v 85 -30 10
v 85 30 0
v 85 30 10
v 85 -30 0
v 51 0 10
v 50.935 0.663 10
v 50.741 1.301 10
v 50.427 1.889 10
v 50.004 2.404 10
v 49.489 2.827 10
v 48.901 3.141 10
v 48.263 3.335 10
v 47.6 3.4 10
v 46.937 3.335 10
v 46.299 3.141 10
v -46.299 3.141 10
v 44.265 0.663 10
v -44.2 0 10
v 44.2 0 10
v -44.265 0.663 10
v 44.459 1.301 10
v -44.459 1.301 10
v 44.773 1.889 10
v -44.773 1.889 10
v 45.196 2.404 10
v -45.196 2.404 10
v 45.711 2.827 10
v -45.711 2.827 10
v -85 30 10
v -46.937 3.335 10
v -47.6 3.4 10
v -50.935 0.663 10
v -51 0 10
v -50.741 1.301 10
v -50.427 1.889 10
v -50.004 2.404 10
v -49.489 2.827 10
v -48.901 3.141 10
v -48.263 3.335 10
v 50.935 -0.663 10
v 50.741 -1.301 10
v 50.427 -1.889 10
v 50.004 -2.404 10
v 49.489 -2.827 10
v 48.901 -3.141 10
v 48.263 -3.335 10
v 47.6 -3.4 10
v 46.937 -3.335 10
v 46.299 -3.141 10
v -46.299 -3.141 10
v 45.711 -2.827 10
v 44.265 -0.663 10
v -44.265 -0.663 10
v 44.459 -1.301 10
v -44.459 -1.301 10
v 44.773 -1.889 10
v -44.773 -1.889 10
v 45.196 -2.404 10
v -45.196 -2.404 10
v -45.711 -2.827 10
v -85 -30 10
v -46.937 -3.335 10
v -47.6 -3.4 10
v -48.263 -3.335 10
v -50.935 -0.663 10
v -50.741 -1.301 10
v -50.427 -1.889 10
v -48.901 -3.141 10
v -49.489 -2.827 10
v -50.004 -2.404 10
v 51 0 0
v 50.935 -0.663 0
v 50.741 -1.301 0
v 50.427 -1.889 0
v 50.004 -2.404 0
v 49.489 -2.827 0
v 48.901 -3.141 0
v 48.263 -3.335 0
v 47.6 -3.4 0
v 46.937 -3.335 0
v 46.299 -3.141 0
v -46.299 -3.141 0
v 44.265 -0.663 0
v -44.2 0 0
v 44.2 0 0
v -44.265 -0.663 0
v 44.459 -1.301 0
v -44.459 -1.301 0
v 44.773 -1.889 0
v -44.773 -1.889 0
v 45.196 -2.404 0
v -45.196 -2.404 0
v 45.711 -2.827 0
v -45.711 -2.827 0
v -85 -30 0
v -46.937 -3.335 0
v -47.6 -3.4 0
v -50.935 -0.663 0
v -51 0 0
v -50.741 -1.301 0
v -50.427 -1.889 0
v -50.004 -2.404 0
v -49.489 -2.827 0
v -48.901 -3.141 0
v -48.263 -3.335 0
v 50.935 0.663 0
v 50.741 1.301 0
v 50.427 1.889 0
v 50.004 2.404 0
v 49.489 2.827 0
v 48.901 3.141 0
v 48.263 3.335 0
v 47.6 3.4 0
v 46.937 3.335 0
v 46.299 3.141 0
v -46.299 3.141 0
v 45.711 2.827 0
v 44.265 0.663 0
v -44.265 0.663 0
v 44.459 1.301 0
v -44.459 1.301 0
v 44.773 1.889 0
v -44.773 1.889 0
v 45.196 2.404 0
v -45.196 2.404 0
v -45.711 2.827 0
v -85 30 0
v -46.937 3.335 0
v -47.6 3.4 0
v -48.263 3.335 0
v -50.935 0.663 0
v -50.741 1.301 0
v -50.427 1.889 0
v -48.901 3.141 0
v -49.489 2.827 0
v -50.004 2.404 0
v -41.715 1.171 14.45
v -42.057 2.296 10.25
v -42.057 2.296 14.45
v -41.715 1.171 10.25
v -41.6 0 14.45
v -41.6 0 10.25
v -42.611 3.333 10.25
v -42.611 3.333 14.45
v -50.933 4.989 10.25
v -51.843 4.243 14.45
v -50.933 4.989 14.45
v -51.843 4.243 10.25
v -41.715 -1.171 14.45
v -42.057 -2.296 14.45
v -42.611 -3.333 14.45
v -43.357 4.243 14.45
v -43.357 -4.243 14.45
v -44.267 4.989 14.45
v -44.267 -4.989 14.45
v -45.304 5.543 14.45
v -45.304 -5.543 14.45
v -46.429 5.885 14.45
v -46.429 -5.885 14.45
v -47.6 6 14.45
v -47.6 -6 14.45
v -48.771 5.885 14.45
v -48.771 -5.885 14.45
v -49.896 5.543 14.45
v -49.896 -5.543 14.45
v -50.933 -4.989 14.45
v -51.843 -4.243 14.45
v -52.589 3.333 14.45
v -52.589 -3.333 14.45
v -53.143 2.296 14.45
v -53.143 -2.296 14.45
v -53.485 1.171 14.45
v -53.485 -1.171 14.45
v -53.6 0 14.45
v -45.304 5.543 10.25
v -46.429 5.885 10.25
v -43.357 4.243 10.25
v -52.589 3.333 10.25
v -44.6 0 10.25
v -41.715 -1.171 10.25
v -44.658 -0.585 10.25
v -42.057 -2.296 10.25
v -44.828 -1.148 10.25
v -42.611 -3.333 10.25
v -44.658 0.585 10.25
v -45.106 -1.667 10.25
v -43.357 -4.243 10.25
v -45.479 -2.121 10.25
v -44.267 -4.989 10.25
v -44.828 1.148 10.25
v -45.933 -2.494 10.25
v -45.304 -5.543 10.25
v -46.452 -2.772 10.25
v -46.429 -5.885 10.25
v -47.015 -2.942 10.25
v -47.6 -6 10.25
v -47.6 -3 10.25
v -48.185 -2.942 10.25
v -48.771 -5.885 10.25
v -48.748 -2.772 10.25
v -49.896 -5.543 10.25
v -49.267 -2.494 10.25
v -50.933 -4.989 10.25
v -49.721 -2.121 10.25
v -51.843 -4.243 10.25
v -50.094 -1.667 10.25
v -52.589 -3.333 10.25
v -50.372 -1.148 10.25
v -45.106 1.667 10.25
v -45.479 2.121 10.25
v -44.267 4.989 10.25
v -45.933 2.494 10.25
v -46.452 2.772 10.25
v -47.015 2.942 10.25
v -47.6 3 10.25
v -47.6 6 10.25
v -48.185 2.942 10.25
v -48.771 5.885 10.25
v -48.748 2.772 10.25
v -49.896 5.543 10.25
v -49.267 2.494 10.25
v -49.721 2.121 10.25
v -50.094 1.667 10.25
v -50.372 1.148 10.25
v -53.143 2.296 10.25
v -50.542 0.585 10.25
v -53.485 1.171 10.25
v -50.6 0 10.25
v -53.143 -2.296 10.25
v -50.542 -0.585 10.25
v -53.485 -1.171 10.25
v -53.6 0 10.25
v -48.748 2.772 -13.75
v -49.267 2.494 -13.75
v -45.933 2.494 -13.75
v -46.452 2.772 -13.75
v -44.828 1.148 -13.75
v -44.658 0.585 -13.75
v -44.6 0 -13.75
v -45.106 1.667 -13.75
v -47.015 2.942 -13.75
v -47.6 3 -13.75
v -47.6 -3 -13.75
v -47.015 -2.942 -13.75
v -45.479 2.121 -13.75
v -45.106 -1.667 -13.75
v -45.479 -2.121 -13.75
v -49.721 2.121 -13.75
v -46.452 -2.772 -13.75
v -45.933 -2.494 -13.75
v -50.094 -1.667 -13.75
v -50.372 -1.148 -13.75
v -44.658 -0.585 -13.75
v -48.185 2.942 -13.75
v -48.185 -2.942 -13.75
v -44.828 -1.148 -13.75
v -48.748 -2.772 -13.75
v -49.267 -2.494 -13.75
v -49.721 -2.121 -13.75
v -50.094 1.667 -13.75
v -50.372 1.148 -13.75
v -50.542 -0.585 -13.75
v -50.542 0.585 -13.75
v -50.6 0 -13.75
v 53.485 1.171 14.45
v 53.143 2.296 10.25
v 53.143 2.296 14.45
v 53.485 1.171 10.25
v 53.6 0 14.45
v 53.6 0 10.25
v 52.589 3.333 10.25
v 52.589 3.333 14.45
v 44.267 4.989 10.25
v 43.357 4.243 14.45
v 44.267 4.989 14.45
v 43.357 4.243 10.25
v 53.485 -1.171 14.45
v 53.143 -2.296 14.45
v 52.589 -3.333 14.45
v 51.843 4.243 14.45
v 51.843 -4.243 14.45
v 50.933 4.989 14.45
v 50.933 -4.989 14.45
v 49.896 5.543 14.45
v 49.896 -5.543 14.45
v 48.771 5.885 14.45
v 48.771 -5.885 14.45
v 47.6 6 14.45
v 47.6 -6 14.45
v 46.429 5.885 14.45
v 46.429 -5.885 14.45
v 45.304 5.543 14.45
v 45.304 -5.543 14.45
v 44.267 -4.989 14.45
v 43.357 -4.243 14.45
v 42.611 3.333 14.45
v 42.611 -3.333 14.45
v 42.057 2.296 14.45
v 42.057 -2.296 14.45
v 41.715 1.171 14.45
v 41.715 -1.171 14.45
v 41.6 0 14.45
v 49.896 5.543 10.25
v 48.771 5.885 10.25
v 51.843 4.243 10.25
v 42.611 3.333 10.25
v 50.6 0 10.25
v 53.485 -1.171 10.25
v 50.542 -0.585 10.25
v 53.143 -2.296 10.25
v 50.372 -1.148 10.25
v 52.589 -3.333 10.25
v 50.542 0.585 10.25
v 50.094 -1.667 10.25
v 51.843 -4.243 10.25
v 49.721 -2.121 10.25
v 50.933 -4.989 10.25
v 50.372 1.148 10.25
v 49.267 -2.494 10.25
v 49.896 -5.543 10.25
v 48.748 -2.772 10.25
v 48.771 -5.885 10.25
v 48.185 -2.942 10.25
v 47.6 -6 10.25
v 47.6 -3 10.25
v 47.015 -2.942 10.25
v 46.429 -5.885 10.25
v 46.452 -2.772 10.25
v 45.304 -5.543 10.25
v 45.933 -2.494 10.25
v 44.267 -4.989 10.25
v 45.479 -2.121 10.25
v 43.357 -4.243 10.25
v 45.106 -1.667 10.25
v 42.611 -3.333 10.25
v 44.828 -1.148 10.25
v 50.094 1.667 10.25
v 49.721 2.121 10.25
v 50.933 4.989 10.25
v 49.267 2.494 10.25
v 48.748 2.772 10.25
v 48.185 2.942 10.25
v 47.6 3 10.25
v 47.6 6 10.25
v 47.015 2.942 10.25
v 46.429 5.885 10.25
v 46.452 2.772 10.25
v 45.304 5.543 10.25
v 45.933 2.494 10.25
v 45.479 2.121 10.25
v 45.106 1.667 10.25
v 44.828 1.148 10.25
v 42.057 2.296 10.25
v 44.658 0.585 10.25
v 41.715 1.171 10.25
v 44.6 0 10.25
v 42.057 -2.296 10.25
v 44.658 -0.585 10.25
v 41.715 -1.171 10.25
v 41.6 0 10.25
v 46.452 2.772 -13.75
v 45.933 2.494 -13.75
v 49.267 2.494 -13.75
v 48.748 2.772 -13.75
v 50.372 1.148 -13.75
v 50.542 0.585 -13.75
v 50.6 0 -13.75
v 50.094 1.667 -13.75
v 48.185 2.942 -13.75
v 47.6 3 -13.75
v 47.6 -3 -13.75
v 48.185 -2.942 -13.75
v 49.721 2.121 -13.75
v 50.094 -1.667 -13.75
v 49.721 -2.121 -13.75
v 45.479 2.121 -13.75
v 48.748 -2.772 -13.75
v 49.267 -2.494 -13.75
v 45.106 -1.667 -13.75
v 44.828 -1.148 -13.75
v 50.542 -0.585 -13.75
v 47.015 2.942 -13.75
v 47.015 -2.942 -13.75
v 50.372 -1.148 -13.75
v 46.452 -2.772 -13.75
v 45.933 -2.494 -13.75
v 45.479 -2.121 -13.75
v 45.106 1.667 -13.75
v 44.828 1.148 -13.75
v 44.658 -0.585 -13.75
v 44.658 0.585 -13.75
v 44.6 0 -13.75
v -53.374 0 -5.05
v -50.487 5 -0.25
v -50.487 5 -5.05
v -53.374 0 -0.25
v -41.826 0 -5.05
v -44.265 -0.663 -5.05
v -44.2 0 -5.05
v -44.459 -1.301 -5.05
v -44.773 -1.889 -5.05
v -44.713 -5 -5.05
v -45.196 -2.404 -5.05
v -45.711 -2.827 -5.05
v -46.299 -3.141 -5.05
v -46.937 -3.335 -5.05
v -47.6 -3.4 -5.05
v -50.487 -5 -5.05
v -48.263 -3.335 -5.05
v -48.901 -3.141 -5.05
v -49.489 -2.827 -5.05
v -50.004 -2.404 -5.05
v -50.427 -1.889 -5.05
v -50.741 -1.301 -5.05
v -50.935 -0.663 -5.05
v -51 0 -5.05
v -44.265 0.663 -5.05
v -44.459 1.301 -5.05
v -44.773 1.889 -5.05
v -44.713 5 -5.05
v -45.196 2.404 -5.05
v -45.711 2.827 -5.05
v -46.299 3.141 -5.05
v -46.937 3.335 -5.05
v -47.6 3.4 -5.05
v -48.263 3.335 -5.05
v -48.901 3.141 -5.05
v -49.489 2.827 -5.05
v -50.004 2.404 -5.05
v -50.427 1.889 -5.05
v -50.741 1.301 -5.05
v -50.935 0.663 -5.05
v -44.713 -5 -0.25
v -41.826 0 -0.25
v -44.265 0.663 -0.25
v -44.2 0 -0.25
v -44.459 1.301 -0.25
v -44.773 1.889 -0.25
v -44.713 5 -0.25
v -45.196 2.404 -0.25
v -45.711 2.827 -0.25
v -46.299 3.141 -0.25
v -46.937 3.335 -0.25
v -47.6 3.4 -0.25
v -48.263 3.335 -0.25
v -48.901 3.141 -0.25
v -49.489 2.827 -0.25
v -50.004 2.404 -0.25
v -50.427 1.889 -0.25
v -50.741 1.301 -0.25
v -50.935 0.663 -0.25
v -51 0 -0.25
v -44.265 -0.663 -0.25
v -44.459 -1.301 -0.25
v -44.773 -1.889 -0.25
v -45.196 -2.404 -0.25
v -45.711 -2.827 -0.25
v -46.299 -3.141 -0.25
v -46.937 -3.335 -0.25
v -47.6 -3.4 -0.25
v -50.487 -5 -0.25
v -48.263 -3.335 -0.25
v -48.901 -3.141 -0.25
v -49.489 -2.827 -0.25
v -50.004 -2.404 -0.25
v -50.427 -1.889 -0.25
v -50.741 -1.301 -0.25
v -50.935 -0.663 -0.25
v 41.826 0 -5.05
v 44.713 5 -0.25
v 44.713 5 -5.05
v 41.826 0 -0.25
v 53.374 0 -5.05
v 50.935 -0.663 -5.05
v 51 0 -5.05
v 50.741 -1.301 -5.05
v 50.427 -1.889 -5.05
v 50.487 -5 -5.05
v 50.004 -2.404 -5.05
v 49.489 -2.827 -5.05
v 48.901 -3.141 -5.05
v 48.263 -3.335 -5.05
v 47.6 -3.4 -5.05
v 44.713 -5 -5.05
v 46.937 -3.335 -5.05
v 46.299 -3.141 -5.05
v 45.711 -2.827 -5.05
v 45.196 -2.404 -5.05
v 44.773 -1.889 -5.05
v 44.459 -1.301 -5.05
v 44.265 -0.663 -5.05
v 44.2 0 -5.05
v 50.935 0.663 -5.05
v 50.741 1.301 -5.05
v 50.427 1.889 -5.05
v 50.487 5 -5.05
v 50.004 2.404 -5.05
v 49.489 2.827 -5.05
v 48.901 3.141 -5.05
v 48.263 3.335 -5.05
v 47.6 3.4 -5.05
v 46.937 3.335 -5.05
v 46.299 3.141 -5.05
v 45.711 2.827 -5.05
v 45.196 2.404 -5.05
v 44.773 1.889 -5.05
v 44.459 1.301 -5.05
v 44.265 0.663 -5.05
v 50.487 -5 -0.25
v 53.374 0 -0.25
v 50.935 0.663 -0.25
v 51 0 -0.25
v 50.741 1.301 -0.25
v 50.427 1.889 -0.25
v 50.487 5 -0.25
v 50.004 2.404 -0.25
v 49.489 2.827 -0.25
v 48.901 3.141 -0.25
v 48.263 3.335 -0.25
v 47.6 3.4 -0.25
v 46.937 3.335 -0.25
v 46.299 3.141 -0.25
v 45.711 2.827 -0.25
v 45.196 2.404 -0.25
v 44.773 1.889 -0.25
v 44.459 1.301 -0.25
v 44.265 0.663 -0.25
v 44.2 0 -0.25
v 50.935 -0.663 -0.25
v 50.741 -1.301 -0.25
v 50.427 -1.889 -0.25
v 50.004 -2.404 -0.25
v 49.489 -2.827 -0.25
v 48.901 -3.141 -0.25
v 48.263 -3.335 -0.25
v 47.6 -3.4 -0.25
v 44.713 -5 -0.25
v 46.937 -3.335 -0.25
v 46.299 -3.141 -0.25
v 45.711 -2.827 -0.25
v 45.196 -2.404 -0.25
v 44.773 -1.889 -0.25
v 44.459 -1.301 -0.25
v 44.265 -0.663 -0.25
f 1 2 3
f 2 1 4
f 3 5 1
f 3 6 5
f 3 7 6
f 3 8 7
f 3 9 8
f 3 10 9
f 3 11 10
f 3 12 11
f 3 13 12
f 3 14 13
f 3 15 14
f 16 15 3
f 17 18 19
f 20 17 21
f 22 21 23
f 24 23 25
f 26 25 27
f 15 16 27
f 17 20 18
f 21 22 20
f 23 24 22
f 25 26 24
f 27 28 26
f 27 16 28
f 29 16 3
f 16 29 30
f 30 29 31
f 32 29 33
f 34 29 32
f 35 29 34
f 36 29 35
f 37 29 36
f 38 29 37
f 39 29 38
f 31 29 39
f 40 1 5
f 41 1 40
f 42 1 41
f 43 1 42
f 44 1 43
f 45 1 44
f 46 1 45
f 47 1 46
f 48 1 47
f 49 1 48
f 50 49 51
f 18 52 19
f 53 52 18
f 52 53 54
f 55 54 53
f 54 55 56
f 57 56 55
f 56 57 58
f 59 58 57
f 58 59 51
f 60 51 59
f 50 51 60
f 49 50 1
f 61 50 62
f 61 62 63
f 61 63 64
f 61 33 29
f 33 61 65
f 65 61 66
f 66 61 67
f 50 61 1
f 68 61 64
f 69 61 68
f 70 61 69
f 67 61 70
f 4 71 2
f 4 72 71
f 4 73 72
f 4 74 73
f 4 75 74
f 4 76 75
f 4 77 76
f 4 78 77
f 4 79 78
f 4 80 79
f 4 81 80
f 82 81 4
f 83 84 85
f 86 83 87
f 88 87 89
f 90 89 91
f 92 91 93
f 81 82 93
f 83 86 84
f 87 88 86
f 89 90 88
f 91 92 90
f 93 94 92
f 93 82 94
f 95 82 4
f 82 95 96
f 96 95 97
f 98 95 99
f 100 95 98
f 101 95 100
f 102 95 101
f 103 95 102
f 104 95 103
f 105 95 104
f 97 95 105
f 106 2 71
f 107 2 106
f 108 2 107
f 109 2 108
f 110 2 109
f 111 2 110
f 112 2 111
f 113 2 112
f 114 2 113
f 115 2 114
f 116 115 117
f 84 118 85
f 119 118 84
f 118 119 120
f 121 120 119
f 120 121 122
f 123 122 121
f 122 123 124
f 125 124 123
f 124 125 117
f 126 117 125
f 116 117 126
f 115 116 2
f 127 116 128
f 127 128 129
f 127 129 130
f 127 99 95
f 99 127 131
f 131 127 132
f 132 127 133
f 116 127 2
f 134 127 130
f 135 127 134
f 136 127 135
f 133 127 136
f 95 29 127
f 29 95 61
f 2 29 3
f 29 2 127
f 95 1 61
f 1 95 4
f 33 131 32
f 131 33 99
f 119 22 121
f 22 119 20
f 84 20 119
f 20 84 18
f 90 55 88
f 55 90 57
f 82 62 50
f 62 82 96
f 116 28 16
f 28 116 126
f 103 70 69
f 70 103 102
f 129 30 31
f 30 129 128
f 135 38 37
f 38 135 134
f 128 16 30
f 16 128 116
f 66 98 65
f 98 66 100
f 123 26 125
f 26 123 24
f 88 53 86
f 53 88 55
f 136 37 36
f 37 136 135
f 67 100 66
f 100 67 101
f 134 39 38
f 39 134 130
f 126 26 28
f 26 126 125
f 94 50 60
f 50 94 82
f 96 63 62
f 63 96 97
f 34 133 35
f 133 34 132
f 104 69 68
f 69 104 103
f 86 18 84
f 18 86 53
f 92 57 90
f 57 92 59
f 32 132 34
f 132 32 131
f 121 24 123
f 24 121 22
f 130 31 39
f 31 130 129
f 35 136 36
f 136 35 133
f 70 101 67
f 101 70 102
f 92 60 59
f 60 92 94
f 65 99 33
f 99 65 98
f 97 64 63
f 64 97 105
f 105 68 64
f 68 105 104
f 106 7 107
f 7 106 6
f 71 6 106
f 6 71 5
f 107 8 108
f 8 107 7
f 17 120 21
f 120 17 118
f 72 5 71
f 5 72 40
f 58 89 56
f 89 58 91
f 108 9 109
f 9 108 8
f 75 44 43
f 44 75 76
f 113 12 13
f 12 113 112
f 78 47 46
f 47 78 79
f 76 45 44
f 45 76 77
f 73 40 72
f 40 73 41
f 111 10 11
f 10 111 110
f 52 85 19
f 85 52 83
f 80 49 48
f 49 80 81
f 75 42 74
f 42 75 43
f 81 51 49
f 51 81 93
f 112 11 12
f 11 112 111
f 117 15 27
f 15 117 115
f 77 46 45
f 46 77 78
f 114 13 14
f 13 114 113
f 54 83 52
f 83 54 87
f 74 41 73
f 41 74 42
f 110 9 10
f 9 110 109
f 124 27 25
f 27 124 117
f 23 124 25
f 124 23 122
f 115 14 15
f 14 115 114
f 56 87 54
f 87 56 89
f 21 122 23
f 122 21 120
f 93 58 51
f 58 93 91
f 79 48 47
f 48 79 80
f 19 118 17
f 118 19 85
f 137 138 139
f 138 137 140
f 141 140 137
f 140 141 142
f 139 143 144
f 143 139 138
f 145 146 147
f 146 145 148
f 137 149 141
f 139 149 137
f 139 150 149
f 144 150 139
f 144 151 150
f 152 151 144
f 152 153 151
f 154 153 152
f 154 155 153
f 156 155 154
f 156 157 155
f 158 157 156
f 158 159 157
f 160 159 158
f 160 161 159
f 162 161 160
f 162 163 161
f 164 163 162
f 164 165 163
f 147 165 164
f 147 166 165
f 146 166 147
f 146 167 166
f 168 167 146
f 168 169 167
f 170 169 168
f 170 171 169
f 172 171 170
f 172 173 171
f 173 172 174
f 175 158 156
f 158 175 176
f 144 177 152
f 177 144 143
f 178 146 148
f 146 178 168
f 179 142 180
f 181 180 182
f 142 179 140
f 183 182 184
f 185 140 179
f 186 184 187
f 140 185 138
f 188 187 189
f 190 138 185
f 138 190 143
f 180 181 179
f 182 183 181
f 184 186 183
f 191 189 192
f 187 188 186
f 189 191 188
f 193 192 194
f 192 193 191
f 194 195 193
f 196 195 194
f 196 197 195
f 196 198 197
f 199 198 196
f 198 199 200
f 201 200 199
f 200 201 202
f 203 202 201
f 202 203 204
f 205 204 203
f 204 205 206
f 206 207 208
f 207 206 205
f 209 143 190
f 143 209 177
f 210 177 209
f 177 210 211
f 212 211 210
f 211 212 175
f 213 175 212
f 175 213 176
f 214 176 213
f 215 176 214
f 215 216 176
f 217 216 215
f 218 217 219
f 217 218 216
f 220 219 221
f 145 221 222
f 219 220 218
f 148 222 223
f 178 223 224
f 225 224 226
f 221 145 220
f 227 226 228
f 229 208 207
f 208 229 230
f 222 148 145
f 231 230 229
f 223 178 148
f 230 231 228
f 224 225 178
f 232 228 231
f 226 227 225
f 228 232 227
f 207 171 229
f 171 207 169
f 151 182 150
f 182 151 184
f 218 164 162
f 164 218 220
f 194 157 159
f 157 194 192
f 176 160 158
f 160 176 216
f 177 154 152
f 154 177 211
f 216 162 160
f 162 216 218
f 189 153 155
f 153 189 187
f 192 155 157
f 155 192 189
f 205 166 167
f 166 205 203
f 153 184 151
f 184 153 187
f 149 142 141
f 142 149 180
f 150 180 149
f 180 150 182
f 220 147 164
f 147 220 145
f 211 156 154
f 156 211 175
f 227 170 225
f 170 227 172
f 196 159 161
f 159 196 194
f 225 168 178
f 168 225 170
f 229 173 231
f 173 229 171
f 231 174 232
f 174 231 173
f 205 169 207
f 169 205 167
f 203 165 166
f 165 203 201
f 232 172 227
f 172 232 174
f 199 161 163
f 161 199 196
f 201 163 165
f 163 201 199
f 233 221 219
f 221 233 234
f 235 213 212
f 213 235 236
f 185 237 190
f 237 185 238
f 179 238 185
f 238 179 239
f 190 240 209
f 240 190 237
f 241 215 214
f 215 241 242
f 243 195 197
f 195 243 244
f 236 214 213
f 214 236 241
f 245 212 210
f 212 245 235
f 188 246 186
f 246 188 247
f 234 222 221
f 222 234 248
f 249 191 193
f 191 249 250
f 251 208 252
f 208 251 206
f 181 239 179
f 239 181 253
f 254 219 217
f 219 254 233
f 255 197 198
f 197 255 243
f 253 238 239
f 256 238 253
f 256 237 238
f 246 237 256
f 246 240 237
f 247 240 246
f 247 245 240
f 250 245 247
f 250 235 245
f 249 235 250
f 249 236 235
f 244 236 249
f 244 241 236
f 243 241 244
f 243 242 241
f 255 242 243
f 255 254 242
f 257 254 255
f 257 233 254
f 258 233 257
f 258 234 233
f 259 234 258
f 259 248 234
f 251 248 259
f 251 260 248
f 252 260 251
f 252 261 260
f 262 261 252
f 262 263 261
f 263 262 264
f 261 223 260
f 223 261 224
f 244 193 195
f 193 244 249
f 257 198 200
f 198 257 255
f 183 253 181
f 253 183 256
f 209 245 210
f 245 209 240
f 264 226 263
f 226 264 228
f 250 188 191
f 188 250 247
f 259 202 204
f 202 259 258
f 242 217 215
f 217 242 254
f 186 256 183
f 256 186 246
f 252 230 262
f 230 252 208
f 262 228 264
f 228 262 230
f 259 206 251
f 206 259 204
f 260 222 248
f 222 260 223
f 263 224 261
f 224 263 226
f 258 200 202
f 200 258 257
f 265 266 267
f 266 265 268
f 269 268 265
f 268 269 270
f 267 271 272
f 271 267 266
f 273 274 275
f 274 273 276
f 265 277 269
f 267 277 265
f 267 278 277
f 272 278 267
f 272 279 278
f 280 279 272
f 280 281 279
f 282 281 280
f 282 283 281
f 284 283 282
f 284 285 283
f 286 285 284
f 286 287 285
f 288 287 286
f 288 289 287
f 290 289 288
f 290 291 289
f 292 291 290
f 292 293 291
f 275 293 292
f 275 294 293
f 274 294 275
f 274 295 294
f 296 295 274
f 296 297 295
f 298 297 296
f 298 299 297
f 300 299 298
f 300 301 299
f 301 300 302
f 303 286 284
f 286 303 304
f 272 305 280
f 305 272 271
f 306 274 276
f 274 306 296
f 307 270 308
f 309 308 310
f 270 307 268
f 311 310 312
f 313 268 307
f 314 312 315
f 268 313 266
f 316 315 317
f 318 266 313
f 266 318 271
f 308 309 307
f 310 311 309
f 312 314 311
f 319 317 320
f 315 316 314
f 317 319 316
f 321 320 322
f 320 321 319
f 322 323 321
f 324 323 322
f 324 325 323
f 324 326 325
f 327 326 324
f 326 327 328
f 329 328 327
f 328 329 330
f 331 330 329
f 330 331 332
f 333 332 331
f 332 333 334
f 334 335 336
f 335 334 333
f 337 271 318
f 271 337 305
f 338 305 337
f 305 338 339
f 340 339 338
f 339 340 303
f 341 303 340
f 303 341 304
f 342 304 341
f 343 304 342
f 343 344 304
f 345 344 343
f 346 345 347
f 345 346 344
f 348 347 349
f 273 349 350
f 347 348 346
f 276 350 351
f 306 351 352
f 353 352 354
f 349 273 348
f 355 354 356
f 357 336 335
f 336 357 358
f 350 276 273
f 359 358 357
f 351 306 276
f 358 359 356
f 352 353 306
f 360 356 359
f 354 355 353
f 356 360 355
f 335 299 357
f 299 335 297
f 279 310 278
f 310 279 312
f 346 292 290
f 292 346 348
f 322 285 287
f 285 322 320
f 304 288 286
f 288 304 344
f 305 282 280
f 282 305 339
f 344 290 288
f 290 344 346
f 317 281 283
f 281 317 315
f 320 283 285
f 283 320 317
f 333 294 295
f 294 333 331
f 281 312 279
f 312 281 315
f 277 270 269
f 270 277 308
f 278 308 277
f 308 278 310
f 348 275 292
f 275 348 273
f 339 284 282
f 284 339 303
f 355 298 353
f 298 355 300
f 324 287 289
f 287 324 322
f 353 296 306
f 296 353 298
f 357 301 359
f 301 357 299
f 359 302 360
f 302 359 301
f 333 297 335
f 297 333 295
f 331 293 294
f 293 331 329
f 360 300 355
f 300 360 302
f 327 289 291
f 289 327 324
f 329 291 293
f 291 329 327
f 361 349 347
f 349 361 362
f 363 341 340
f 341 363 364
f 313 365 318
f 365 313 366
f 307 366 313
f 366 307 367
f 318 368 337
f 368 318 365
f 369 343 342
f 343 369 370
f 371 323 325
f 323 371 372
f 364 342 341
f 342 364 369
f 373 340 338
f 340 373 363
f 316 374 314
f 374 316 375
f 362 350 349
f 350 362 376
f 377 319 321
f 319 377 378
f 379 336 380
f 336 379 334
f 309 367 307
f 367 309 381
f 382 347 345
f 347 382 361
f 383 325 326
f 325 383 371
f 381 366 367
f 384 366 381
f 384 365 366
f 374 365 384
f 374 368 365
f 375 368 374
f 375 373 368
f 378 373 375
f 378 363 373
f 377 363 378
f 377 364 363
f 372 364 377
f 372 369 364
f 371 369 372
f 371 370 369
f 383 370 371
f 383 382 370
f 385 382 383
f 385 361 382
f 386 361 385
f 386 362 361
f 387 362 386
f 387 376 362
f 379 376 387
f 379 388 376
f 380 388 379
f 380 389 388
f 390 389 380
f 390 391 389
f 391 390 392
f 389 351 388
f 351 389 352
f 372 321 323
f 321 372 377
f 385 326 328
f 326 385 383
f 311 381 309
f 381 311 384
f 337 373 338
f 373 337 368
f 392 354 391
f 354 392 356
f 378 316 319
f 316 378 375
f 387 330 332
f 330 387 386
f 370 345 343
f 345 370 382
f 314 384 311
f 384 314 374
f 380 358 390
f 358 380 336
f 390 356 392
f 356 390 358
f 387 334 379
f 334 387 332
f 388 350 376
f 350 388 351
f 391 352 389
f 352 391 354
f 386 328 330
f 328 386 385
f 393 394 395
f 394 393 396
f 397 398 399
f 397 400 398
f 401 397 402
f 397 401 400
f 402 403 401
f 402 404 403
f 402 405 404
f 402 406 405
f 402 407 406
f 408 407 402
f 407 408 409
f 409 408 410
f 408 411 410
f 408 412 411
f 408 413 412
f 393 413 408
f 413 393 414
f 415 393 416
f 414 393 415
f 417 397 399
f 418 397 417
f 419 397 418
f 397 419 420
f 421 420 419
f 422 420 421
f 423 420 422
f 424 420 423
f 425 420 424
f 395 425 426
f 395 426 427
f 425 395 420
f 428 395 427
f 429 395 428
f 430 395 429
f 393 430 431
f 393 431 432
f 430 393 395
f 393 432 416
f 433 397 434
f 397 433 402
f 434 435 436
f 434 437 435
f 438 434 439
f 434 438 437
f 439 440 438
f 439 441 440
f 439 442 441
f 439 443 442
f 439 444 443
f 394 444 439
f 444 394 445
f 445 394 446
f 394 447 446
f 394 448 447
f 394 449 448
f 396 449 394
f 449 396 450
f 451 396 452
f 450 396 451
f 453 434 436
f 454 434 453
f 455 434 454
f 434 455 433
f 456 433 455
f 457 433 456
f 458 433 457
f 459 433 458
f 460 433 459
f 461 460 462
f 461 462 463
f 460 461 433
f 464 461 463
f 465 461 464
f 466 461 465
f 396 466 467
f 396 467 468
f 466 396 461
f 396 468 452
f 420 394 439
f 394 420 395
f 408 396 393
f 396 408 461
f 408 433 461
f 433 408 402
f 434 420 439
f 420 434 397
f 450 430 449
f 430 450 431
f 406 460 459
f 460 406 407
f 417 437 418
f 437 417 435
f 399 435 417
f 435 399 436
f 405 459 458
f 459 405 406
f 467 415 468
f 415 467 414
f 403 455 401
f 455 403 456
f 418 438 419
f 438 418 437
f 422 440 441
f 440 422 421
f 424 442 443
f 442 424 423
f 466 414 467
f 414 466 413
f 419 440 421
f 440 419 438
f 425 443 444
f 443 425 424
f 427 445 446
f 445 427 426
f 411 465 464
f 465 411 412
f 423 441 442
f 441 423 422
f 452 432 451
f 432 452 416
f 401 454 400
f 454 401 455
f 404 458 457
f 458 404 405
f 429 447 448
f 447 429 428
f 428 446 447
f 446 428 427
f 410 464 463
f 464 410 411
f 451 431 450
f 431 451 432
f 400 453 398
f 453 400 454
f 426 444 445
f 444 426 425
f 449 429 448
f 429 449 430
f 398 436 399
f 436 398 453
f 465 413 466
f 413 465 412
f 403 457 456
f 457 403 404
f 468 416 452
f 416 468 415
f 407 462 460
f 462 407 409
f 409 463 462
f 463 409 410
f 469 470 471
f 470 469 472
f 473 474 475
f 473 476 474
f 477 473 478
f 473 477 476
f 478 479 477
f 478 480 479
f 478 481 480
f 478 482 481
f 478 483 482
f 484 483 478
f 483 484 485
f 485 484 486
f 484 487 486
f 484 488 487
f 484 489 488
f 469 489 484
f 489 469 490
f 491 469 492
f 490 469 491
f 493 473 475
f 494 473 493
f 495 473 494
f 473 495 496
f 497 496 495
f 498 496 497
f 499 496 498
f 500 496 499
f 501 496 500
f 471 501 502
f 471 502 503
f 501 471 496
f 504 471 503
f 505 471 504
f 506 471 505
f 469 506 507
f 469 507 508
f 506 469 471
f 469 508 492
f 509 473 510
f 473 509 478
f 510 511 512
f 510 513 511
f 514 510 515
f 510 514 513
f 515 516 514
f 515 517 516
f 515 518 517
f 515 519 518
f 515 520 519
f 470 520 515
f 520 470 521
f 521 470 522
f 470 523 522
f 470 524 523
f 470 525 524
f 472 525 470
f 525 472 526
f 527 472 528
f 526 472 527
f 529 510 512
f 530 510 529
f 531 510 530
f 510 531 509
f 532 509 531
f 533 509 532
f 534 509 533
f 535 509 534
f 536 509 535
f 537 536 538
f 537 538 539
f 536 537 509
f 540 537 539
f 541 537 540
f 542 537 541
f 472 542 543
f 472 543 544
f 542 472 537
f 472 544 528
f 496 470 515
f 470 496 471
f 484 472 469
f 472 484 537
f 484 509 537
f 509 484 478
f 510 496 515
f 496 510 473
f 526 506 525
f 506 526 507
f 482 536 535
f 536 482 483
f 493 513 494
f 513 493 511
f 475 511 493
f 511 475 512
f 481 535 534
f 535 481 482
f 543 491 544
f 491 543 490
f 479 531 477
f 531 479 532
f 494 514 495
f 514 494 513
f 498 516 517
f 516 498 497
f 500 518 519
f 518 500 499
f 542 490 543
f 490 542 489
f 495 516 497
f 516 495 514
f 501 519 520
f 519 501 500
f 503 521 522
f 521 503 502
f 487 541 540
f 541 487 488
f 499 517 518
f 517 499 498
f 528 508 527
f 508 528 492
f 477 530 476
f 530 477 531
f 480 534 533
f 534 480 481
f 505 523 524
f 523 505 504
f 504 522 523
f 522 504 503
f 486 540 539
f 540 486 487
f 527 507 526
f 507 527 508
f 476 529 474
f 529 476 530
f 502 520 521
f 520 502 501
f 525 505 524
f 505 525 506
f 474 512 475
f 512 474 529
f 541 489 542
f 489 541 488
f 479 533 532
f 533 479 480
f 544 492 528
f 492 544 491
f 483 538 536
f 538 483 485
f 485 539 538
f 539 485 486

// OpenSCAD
$fn = 32;

// ------------------------------------------------------------------------
// Bolted plate: 170 x 60 x 10 mm plate, 2 fasteners
// Every part is its own module, assembly() places them once.
// ------------------------------------------------------------------------

// --- part 1 ---
module plate() {
  difference() {
    translate([-85, -30, 0]) cube([170, 60, 10]);
    translate([-47.6, 0, -1]) cylinder(h = 12, d = 6.8);
    translate([47.6, 0, -1]) cylinder(h = 12, d = 6.8);
  }
}

// --- part 2 ---
module bolt1() {
  cylinder(h = 4.2, d = 12);
  translate([0, 0, -24]) cylinder(h = 24, d = 6);
}

// --- part 3 ---
module bolt2() {
  cylinder(h = 4.2, d = 12);
  translate([0, 0, -24]) cylinder(h = 24, d = 6);
}

// --- part 4 ---
module nut1() {
  difference() {
    linear_extrude(height = 4.8) polygon(points = [[5.774, 0], [2.887, 5], [-2.887, 5], [-5.774, 0], [-2.887, -5], [2.887, -5]]);
    translate([0, 0, -1]) cylinder(h = 6.8, d = 6.8);
  }
}

// --- part 5 ---
module nut2() {
  difference() {
    linear_extrude(height = 4.8) polygon(points = [[5.774, 0], [2.887, 5], [-2.887, 5], [-5.774, 0], [-2.887, -5], [2.887, -5]]);
    translate([0, 0, -1]) cylinder(h = 6.8, d = 6.8);
  }
}

// --- assembly ---
module assembly() {
  translate([0, 0, 0]) rotate([0, 0, 0]) plate();
  translate([-47.6, 0, 10.25]) rotate([0, 0, 0]) bolt1();
  translate([47.6, 0, 10.25]) rotate([0, 0, 0]) bolt2();
  translate([-47.6, 0, -5.05]) rotate([0, 0, 0]) nut1();
  translate([47.6, 0, -5.05]) rotate([0, 0, 0]) nut2();
}

assembly();
